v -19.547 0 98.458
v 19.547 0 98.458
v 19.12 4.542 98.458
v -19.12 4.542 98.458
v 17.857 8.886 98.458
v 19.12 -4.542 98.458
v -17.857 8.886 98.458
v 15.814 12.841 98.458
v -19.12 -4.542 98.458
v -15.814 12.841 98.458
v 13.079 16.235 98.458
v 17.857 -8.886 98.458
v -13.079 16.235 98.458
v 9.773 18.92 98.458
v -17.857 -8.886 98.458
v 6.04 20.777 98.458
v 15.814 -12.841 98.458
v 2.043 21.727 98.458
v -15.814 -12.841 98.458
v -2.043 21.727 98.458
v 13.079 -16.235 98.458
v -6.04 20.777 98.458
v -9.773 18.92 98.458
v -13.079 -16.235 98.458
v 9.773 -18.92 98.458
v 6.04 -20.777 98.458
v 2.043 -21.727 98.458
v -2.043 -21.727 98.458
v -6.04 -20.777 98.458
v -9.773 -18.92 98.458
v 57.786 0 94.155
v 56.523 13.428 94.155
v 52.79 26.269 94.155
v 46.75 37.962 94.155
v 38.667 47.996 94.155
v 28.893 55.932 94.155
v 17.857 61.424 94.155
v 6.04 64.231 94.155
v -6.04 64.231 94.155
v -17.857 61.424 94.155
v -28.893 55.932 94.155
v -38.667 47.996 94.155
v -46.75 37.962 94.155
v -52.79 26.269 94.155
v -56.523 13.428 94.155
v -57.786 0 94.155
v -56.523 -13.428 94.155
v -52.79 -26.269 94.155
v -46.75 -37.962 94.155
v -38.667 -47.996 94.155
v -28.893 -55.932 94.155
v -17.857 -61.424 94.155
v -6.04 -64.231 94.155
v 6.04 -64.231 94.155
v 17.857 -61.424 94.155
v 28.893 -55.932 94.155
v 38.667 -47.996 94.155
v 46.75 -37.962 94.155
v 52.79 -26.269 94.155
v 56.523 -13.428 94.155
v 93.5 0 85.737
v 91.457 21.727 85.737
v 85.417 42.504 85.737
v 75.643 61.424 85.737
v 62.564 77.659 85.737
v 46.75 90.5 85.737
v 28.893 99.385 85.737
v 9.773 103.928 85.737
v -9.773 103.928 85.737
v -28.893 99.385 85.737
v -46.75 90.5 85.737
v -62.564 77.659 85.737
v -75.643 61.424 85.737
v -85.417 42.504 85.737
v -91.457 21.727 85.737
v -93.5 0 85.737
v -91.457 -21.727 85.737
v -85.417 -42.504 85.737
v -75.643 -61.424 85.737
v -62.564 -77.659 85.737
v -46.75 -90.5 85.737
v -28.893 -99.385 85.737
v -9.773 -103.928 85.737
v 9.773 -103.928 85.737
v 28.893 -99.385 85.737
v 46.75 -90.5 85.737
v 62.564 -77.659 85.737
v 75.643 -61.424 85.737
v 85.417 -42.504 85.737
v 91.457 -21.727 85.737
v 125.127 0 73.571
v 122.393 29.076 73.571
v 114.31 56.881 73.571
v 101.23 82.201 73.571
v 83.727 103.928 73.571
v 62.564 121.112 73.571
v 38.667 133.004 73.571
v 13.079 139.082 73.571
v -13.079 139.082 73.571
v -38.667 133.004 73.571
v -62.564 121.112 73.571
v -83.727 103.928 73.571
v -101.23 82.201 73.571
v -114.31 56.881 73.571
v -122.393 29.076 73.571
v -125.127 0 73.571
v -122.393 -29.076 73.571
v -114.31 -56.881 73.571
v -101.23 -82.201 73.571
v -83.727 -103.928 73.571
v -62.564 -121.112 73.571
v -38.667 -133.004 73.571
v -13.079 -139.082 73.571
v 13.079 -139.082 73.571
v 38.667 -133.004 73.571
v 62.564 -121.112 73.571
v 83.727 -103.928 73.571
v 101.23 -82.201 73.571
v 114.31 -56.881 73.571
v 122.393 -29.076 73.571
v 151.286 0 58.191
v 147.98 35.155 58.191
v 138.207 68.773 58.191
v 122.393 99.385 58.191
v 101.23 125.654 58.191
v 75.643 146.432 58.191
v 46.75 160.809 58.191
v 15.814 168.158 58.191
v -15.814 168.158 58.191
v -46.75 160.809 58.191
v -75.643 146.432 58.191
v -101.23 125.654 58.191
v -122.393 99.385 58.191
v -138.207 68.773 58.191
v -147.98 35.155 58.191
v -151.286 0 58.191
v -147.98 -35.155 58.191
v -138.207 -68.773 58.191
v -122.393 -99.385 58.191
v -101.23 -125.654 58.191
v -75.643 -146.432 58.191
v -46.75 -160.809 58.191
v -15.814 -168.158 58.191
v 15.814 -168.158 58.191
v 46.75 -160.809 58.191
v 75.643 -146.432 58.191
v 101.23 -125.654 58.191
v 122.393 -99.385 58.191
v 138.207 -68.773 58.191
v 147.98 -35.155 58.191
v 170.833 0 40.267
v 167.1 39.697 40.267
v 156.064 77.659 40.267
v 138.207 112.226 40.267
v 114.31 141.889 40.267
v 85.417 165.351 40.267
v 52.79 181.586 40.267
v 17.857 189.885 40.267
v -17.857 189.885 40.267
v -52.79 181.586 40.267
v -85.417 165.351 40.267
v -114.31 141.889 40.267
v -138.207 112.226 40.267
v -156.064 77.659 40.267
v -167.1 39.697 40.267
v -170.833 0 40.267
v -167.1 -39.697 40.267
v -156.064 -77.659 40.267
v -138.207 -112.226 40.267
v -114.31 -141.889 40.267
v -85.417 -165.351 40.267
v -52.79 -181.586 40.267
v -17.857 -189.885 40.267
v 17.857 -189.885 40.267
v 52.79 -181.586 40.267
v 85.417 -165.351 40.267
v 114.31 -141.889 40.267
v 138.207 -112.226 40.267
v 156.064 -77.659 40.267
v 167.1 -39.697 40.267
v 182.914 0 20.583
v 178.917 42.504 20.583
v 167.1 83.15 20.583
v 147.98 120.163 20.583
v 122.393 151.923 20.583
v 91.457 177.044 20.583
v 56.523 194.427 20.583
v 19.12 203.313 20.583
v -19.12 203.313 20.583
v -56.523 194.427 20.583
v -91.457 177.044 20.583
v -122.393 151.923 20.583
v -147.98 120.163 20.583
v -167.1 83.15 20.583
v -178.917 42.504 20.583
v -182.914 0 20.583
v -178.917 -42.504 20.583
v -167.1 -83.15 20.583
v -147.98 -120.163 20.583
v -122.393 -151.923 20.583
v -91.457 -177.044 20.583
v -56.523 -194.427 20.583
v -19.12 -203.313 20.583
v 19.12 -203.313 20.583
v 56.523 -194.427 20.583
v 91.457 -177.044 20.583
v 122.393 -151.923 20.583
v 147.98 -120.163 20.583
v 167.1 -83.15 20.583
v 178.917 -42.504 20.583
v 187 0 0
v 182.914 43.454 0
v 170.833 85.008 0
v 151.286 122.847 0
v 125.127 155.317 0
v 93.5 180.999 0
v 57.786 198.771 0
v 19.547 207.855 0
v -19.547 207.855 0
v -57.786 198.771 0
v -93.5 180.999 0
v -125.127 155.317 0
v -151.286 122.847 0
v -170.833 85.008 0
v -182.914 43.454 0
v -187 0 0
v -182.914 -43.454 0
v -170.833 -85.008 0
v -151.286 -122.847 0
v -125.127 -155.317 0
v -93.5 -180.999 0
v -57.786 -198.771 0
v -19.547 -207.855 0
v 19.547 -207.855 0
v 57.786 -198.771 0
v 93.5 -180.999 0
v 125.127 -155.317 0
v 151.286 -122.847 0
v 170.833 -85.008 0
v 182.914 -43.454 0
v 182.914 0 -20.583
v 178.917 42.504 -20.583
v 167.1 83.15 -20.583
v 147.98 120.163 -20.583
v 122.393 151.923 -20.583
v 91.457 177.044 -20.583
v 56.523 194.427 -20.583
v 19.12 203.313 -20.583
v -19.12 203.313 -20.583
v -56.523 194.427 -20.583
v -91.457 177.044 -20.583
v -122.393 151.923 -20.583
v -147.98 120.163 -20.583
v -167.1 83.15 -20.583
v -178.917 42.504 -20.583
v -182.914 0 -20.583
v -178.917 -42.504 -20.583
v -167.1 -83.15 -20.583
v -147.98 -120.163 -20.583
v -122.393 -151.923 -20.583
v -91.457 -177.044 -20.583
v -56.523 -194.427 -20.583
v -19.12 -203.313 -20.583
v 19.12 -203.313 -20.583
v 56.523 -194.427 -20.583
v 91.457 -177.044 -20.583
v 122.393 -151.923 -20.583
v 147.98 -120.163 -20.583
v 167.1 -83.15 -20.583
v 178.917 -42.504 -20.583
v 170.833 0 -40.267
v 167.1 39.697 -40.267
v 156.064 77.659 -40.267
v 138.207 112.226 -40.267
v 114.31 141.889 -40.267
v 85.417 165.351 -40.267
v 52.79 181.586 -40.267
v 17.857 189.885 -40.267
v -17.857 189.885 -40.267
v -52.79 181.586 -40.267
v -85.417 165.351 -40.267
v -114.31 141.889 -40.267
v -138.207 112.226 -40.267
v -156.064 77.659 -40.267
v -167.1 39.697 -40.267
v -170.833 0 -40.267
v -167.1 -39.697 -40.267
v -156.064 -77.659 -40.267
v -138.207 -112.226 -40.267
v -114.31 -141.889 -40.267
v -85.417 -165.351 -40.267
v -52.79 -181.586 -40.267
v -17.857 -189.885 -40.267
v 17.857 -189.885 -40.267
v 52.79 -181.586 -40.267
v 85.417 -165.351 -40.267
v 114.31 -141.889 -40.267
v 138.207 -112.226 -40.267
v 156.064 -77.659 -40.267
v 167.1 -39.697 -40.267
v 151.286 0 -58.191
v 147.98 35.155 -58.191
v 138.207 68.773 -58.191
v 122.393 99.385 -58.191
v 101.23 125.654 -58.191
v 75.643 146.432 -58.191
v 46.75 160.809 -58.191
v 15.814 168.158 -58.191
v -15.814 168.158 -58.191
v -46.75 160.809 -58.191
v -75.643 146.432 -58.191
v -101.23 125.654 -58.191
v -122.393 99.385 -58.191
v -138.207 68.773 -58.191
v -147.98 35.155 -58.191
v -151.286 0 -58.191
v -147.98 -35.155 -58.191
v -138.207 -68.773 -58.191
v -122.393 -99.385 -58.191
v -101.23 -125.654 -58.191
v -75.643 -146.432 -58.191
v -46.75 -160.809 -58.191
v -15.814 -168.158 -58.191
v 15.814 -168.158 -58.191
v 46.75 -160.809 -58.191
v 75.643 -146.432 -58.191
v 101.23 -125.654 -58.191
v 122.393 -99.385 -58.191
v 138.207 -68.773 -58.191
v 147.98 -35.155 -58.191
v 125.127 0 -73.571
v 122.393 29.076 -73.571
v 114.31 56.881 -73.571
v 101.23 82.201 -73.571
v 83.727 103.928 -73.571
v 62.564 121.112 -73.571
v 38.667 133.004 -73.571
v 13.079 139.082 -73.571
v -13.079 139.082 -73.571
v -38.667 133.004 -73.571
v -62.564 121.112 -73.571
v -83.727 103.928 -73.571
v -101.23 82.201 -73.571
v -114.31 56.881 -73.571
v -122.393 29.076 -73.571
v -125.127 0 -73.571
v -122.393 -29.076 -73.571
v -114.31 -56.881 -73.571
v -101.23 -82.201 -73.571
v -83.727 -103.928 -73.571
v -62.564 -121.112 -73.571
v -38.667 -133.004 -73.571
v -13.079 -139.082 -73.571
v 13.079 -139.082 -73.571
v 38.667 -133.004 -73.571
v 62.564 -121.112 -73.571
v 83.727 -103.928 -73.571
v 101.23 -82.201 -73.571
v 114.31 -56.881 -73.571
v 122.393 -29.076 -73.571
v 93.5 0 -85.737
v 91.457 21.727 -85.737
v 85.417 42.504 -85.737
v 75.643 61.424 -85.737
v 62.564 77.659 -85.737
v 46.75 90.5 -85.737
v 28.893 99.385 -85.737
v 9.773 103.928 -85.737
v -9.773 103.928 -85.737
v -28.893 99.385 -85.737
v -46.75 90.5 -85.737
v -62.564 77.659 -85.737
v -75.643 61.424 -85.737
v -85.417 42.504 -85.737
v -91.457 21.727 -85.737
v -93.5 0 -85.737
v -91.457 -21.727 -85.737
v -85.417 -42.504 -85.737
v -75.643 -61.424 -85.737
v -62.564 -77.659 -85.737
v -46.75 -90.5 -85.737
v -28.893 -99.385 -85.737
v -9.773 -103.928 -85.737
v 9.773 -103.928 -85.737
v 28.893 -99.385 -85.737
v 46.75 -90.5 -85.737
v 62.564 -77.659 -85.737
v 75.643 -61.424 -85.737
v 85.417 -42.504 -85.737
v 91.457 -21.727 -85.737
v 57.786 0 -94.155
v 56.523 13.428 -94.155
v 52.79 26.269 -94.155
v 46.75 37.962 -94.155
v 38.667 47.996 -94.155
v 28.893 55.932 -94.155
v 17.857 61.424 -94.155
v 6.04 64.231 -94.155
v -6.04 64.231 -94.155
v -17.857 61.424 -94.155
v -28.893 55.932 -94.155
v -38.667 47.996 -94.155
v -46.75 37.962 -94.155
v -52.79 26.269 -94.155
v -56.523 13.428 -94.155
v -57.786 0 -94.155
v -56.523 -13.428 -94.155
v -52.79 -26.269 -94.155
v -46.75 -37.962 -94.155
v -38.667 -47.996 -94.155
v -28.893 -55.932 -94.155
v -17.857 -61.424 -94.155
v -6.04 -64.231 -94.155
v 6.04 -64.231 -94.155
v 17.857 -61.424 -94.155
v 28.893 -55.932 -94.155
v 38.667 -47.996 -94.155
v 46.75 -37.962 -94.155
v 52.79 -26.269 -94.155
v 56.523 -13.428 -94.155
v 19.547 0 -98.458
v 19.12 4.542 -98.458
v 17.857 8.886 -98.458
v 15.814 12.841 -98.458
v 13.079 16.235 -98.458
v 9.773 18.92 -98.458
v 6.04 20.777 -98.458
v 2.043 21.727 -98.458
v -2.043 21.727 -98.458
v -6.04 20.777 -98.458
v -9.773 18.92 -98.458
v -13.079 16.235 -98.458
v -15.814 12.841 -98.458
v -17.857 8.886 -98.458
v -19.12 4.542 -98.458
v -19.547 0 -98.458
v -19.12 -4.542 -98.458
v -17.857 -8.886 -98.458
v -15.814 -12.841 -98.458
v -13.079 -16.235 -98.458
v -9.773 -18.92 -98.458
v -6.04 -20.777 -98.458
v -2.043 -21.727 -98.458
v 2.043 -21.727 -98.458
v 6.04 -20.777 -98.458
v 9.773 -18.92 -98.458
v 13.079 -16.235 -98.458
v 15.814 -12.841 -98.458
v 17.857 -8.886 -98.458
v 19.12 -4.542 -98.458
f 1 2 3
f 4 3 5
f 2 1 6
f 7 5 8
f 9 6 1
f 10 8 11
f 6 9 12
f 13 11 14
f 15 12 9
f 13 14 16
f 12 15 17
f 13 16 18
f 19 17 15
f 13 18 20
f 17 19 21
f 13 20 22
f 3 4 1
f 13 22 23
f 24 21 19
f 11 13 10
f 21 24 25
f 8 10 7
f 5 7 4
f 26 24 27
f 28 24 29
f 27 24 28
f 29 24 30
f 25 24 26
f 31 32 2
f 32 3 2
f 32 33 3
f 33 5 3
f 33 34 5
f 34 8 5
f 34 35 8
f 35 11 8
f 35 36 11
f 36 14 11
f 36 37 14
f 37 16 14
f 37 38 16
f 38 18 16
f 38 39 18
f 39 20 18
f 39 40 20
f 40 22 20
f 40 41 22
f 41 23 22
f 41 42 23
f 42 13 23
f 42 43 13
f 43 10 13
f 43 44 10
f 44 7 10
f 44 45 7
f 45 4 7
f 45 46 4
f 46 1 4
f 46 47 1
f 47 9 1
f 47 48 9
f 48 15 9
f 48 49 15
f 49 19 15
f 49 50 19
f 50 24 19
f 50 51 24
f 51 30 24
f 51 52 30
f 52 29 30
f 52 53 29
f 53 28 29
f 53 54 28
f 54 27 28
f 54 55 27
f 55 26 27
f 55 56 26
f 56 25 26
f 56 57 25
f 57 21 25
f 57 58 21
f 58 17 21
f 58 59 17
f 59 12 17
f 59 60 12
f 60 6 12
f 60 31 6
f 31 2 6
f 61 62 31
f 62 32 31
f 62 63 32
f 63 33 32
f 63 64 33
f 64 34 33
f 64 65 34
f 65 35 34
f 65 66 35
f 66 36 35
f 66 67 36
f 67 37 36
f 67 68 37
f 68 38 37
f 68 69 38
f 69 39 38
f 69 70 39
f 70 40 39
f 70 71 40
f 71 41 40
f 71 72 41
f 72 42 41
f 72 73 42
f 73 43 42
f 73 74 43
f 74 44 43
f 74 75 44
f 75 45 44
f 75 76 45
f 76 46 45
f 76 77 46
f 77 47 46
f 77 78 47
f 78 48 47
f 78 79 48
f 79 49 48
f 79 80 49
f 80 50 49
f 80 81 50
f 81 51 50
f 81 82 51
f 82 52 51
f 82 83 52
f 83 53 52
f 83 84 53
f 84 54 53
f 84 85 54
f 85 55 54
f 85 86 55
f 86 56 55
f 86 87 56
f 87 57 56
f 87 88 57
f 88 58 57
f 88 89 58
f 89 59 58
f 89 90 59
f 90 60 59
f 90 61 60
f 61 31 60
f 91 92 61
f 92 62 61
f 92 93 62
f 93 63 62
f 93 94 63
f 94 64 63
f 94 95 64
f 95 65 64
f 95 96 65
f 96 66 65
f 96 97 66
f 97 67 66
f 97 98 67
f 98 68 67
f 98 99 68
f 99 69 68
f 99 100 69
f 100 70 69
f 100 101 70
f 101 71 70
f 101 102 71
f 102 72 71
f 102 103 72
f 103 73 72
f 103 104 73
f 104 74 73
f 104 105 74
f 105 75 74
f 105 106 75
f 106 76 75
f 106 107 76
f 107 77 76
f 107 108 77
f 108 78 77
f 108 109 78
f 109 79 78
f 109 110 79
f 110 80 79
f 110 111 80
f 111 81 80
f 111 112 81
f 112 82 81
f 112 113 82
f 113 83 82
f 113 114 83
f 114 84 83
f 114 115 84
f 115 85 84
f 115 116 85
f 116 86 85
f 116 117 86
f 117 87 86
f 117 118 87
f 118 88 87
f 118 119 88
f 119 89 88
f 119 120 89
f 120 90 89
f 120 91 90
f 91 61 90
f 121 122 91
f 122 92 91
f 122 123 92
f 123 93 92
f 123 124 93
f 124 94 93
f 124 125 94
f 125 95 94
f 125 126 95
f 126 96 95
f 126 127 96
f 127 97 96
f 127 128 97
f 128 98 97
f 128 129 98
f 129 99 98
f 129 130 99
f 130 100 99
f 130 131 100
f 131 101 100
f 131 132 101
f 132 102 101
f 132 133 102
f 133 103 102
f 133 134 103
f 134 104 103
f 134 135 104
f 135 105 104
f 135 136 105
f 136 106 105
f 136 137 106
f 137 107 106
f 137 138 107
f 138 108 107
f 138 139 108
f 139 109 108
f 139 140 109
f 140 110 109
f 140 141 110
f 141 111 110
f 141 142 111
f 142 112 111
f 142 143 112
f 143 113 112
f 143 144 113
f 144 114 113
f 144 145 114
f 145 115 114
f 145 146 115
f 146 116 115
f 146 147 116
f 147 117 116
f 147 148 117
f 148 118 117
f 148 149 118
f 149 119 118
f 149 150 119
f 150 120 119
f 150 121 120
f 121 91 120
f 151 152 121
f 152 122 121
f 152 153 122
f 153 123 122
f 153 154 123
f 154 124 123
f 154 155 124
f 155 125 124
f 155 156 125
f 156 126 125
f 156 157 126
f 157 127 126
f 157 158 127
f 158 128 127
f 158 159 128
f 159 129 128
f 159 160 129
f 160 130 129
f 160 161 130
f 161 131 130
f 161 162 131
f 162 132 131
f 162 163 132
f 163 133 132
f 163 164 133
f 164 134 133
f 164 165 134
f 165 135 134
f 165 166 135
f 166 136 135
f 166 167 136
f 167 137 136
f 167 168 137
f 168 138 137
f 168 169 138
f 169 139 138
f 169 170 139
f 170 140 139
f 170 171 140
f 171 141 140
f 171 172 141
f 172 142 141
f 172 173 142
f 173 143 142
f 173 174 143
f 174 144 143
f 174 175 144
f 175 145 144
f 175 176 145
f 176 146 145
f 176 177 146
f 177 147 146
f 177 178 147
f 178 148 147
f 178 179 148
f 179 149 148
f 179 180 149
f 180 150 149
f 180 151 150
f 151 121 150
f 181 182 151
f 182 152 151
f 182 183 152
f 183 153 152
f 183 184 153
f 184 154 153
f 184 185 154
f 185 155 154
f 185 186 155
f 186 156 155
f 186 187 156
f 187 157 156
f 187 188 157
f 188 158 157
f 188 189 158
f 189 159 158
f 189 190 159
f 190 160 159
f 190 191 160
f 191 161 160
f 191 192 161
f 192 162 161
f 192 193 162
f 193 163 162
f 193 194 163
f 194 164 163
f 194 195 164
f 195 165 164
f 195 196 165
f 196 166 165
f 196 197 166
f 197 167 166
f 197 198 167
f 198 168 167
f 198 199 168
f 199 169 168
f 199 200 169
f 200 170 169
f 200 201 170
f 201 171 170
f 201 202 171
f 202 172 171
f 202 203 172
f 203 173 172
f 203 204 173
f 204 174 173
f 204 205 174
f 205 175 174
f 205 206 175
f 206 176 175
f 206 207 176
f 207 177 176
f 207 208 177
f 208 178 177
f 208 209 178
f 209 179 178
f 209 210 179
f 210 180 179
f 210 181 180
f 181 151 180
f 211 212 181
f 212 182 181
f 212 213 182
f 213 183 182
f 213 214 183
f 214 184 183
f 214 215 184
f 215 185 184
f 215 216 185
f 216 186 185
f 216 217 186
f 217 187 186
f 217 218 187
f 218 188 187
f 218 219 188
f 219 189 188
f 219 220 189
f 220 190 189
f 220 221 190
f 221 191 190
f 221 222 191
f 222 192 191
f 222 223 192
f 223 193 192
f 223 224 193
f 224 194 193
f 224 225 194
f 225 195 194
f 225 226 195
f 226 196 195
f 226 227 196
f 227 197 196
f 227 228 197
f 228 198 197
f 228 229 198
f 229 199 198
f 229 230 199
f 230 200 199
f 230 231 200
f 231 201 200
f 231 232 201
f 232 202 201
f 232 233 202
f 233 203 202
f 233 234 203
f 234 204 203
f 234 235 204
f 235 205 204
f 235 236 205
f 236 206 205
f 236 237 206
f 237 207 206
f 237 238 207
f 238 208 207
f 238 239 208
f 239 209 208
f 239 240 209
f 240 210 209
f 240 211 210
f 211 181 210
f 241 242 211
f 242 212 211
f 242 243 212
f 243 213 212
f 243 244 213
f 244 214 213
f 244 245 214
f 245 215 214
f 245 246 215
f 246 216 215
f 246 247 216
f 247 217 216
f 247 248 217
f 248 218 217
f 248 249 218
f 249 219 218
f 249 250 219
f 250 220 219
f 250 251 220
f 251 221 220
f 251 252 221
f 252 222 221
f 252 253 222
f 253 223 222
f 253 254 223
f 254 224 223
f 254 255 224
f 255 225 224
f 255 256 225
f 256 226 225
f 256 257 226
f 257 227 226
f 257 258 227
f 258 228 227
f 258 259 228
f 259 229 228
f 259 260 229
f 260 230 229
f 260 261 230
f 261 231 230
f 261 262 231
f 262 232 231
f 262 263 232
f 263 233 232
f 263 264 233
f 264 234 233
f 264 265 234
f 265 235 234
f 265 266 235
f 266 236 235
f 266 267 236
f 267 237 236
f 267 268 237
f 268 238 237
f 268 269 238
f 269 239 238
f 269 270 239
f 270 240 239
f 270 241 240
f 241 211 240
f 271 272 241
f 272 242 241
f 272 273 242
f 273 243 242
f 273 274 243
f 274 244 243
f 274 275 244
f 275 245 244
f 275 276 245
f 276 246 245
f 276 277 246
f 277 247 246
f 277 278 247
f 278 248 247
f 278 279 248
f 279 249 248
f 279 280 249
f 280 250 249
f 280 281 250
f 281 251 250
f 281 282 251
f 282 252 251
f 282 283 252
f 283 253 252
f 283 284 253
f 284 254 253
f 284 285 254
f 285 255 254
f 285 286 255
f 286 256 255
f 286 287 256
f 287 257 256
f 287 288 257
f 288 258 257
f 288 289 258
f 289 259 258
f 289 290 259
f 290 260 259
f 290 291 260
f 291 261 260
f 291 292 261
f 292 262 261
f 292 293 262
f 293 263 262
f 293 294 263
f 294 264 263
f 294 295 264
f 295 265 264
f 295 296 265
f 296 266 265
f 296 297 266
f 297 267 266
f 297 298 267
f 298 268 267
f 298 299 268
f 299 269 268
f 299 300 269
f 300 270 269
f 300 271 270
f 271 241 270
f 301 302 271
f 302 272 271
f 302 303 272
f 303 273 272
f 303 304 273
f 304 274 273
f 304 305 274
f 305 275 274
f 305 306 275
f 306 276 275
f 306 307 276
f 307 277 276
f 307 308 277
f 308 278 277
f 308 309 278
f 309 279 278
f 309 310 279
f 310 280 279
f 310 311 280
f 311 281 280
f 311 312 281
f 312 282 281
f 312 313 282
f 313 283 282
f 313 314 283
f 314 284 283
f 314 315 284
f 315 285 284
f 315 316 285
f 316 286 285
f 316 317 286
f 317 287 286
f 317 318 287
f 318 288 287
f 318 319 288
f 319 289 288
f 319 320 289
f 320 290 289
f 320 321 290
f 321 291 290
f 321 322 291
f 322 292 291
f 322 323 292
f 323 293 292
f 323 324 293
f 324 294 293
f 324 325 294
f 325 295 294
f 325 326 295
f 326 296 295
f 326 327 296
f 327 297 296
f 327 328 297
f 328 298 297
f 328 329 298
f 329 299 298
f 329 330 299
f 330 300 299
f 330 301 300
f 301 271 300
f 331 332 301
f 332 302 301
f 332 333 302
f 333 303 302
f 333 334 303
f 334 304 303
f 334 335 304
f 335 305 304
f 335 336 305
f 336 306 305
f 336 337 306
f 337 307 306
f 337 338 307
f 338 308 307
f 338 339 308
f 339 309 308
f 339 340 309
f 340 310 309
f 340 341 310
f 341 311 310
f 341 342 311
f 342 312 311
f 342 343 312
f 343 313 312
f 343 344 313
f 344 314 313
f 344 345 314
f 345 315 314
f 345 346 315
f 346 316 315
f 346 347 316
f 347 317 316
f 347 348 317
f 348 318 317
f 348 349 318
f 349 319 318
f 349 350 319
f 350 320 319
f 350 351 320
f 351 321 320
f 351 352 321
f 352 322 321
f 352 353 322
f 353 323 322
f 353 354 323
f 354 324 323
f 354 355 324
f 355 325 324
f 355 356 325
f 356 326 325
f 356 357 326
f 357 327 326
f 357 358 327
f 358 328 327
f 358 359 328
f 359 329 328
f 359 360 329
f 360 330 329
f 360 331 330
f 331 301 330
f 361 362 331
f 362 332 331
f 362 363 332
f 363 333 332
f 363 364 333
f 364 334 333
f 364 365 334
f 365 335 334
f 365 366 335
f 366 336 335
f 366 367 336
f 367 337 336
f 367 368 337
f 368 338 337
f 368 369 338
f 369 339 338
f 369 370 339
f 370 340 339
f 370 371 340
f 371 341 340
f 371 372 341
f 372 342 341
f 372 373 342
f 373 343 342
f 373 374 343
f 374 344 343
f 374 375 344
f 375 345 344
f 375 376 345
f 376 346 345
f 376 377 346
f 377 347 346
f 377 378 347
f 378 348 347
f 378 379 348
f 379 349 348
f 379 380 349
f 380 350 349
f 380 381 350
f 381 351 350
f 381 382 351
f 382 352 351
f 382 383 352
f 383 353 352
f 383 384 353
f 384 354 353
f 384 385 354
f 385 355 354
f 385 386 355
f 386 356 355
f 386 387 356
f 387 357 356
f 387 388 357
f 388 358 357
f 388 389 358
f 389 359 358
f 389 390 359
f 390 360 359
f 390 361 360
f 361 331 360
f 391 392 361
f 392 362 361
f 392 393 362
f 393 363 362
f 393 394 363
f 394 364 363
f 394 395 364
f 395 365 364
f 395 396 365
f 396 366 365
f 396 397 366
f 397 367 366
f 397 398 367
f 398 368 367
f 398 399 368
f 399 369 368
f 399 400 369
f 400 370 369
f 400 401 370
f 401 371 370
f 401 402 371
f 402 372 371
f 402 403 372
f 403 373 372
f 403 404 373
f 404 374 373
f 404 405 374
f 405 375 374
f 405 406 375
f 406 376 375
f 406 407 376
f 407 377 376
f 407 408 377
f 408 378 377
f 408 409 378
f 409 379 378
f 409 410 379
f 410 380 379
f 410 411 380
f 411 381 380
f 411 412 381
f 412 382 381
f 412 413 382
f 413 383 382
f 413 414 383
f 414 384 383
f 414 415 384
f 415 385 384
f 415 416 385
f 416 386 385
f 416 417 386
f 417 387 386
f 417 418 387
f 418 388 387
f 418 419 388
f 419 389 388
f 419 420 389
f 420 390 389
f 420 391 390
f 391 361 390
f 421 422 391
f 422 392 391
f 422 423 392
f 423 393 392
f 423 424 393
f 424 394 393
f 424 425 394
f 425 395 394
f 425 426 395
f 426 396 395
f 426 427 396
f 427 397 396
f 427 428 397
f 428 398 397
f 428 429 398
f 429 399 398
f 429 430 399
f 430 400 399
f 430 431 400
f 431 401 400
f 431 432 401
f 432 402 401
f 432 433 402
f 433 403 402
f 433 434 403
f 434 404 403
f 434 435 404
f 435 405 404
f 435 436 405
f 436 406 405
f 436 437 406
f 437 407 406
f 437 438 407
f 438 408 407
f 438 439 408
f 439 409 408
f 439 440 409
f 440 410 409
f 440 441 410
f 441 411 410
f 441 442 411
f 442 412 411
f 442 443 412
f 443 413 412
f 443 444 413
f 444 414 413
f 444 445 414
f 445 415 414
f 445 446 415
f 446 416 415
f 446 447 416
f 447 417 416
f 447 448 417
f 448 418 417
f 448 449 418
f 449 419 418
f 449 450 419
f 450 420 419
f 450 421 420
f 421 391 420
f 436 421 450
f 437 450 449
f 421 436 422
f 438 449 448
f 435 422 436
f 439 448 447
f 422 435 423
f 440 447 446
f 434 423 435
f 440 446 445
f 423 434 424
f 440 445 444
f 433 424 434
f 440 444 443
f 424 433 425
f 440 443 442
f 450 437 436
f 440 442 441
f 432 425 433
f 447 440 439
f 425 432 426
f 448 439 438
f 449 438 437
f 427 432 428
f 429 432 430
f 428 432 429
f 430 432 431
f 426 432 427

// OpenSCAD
// Generated by SolidPython 1.0.1 on 2020-07-29 00:46:53


scale(v = [17, 19, 9]) {
	sphere(r = 11);
}
/***********************************************
*********      SolidPython code:      **********
************************************************
 
# import packages: SolidPython
from solid import *
from solid.utils import *
from itertools import chain, combinations, permutations


class Resize:

    def __init__(self, scad_file):
        self.scad_file = scad_file
        #self.scad_file = import_scad(scad_file)
        # cone/cylinder param:
        self.r1 = 0
        self.r2 = 0
        self.h = 0
        # rectangular prism param:
        self.w = 0
        self.l = 0
        # ellipse param:
        self.r = 0

    # import OpenScad code (file name corresponds to shape)


    # classify shape + parameters
    def assign(self, param1, param2, param3):
        if self.scad_file == 'cone.scad':
            self.r1 = param1
            self.r2 = param2
            self.h = param3
        elif self.scad_file == 'cylinder.scad':
            self.r1 = param1
            self.r2 = param2
            self.h = param3
        elif self.scad_file == 'rectangularPrism.scad':
            self.h = param1
            self.l = param2
            self.w = param3
        else:
            self.r = param1
            self.h = param2

    # resize parameters
    def iterate(self):
        x = range(3, 20, 2)
        i = 1
        if self.scad_file == 'cone.scad':
            tempList = list(permutations(x, 2))
            for temp in tempList:
                param1 = temp[0]
                param2 = temp[1]
                filepath = 'produced_scad_files/' + 'cone' + str(param1) + '_' + str(param2) + '_' + '.scad'
                scad_render_to_file(cylinder(h=param1, r1=param2, r2=0), filepath)

        elif self.scad_file == 'cylinder.scad':
            tempList = list(permutations(x, 3))
            for temp in tempList:
                param1 = temp[0]
                param2 = temp[1]
                filepath = 'produced_scad_files/' + 'cylinder' + str(param1) + '_' + str(param2) + '_' + '.scad'
                scad_render_to_file(cylinder(h=param1, r1=param2, r2=param2), filepath)

        elif self.scad_file == 'rectangularPrism.scad':
            tempList = list(permutations(x, 3))
            for temp in tempList:
                param1 = temp[0]
                param2 = temp[1]
                param3 = temp[2]
                filepath = 'produced_scad_files/' + 'rectangularPrism' + str(param1) + '_' + str(param2) + '_' + str(
                    param3) + '.scad'
                scad_render_to_file(cube(size=(param1, param2, param3)), filepath)

        elif self.scad_file == 'ellipse.scad':
            tempList = list(permutations(x, 4))
            for temp in tempList:
                param1 = temp[0]
                param2 = temp[1]
                param3 = temp[2]
                param4 = temp[3]
                filepath = 'produced_scad_files/' + 'ellipse' + str(param1) + '_' + str(param2) + '_' + str(param3) + '_' + str(param4) + '.scad'
                scad_render_to_file(scale([param1, param2, param3])(sphere(r=param4)), filepath)

    def render_to_scadfile(self):
        scad_render_to_file(scad, 'example.scad') 
 
************************************************/
